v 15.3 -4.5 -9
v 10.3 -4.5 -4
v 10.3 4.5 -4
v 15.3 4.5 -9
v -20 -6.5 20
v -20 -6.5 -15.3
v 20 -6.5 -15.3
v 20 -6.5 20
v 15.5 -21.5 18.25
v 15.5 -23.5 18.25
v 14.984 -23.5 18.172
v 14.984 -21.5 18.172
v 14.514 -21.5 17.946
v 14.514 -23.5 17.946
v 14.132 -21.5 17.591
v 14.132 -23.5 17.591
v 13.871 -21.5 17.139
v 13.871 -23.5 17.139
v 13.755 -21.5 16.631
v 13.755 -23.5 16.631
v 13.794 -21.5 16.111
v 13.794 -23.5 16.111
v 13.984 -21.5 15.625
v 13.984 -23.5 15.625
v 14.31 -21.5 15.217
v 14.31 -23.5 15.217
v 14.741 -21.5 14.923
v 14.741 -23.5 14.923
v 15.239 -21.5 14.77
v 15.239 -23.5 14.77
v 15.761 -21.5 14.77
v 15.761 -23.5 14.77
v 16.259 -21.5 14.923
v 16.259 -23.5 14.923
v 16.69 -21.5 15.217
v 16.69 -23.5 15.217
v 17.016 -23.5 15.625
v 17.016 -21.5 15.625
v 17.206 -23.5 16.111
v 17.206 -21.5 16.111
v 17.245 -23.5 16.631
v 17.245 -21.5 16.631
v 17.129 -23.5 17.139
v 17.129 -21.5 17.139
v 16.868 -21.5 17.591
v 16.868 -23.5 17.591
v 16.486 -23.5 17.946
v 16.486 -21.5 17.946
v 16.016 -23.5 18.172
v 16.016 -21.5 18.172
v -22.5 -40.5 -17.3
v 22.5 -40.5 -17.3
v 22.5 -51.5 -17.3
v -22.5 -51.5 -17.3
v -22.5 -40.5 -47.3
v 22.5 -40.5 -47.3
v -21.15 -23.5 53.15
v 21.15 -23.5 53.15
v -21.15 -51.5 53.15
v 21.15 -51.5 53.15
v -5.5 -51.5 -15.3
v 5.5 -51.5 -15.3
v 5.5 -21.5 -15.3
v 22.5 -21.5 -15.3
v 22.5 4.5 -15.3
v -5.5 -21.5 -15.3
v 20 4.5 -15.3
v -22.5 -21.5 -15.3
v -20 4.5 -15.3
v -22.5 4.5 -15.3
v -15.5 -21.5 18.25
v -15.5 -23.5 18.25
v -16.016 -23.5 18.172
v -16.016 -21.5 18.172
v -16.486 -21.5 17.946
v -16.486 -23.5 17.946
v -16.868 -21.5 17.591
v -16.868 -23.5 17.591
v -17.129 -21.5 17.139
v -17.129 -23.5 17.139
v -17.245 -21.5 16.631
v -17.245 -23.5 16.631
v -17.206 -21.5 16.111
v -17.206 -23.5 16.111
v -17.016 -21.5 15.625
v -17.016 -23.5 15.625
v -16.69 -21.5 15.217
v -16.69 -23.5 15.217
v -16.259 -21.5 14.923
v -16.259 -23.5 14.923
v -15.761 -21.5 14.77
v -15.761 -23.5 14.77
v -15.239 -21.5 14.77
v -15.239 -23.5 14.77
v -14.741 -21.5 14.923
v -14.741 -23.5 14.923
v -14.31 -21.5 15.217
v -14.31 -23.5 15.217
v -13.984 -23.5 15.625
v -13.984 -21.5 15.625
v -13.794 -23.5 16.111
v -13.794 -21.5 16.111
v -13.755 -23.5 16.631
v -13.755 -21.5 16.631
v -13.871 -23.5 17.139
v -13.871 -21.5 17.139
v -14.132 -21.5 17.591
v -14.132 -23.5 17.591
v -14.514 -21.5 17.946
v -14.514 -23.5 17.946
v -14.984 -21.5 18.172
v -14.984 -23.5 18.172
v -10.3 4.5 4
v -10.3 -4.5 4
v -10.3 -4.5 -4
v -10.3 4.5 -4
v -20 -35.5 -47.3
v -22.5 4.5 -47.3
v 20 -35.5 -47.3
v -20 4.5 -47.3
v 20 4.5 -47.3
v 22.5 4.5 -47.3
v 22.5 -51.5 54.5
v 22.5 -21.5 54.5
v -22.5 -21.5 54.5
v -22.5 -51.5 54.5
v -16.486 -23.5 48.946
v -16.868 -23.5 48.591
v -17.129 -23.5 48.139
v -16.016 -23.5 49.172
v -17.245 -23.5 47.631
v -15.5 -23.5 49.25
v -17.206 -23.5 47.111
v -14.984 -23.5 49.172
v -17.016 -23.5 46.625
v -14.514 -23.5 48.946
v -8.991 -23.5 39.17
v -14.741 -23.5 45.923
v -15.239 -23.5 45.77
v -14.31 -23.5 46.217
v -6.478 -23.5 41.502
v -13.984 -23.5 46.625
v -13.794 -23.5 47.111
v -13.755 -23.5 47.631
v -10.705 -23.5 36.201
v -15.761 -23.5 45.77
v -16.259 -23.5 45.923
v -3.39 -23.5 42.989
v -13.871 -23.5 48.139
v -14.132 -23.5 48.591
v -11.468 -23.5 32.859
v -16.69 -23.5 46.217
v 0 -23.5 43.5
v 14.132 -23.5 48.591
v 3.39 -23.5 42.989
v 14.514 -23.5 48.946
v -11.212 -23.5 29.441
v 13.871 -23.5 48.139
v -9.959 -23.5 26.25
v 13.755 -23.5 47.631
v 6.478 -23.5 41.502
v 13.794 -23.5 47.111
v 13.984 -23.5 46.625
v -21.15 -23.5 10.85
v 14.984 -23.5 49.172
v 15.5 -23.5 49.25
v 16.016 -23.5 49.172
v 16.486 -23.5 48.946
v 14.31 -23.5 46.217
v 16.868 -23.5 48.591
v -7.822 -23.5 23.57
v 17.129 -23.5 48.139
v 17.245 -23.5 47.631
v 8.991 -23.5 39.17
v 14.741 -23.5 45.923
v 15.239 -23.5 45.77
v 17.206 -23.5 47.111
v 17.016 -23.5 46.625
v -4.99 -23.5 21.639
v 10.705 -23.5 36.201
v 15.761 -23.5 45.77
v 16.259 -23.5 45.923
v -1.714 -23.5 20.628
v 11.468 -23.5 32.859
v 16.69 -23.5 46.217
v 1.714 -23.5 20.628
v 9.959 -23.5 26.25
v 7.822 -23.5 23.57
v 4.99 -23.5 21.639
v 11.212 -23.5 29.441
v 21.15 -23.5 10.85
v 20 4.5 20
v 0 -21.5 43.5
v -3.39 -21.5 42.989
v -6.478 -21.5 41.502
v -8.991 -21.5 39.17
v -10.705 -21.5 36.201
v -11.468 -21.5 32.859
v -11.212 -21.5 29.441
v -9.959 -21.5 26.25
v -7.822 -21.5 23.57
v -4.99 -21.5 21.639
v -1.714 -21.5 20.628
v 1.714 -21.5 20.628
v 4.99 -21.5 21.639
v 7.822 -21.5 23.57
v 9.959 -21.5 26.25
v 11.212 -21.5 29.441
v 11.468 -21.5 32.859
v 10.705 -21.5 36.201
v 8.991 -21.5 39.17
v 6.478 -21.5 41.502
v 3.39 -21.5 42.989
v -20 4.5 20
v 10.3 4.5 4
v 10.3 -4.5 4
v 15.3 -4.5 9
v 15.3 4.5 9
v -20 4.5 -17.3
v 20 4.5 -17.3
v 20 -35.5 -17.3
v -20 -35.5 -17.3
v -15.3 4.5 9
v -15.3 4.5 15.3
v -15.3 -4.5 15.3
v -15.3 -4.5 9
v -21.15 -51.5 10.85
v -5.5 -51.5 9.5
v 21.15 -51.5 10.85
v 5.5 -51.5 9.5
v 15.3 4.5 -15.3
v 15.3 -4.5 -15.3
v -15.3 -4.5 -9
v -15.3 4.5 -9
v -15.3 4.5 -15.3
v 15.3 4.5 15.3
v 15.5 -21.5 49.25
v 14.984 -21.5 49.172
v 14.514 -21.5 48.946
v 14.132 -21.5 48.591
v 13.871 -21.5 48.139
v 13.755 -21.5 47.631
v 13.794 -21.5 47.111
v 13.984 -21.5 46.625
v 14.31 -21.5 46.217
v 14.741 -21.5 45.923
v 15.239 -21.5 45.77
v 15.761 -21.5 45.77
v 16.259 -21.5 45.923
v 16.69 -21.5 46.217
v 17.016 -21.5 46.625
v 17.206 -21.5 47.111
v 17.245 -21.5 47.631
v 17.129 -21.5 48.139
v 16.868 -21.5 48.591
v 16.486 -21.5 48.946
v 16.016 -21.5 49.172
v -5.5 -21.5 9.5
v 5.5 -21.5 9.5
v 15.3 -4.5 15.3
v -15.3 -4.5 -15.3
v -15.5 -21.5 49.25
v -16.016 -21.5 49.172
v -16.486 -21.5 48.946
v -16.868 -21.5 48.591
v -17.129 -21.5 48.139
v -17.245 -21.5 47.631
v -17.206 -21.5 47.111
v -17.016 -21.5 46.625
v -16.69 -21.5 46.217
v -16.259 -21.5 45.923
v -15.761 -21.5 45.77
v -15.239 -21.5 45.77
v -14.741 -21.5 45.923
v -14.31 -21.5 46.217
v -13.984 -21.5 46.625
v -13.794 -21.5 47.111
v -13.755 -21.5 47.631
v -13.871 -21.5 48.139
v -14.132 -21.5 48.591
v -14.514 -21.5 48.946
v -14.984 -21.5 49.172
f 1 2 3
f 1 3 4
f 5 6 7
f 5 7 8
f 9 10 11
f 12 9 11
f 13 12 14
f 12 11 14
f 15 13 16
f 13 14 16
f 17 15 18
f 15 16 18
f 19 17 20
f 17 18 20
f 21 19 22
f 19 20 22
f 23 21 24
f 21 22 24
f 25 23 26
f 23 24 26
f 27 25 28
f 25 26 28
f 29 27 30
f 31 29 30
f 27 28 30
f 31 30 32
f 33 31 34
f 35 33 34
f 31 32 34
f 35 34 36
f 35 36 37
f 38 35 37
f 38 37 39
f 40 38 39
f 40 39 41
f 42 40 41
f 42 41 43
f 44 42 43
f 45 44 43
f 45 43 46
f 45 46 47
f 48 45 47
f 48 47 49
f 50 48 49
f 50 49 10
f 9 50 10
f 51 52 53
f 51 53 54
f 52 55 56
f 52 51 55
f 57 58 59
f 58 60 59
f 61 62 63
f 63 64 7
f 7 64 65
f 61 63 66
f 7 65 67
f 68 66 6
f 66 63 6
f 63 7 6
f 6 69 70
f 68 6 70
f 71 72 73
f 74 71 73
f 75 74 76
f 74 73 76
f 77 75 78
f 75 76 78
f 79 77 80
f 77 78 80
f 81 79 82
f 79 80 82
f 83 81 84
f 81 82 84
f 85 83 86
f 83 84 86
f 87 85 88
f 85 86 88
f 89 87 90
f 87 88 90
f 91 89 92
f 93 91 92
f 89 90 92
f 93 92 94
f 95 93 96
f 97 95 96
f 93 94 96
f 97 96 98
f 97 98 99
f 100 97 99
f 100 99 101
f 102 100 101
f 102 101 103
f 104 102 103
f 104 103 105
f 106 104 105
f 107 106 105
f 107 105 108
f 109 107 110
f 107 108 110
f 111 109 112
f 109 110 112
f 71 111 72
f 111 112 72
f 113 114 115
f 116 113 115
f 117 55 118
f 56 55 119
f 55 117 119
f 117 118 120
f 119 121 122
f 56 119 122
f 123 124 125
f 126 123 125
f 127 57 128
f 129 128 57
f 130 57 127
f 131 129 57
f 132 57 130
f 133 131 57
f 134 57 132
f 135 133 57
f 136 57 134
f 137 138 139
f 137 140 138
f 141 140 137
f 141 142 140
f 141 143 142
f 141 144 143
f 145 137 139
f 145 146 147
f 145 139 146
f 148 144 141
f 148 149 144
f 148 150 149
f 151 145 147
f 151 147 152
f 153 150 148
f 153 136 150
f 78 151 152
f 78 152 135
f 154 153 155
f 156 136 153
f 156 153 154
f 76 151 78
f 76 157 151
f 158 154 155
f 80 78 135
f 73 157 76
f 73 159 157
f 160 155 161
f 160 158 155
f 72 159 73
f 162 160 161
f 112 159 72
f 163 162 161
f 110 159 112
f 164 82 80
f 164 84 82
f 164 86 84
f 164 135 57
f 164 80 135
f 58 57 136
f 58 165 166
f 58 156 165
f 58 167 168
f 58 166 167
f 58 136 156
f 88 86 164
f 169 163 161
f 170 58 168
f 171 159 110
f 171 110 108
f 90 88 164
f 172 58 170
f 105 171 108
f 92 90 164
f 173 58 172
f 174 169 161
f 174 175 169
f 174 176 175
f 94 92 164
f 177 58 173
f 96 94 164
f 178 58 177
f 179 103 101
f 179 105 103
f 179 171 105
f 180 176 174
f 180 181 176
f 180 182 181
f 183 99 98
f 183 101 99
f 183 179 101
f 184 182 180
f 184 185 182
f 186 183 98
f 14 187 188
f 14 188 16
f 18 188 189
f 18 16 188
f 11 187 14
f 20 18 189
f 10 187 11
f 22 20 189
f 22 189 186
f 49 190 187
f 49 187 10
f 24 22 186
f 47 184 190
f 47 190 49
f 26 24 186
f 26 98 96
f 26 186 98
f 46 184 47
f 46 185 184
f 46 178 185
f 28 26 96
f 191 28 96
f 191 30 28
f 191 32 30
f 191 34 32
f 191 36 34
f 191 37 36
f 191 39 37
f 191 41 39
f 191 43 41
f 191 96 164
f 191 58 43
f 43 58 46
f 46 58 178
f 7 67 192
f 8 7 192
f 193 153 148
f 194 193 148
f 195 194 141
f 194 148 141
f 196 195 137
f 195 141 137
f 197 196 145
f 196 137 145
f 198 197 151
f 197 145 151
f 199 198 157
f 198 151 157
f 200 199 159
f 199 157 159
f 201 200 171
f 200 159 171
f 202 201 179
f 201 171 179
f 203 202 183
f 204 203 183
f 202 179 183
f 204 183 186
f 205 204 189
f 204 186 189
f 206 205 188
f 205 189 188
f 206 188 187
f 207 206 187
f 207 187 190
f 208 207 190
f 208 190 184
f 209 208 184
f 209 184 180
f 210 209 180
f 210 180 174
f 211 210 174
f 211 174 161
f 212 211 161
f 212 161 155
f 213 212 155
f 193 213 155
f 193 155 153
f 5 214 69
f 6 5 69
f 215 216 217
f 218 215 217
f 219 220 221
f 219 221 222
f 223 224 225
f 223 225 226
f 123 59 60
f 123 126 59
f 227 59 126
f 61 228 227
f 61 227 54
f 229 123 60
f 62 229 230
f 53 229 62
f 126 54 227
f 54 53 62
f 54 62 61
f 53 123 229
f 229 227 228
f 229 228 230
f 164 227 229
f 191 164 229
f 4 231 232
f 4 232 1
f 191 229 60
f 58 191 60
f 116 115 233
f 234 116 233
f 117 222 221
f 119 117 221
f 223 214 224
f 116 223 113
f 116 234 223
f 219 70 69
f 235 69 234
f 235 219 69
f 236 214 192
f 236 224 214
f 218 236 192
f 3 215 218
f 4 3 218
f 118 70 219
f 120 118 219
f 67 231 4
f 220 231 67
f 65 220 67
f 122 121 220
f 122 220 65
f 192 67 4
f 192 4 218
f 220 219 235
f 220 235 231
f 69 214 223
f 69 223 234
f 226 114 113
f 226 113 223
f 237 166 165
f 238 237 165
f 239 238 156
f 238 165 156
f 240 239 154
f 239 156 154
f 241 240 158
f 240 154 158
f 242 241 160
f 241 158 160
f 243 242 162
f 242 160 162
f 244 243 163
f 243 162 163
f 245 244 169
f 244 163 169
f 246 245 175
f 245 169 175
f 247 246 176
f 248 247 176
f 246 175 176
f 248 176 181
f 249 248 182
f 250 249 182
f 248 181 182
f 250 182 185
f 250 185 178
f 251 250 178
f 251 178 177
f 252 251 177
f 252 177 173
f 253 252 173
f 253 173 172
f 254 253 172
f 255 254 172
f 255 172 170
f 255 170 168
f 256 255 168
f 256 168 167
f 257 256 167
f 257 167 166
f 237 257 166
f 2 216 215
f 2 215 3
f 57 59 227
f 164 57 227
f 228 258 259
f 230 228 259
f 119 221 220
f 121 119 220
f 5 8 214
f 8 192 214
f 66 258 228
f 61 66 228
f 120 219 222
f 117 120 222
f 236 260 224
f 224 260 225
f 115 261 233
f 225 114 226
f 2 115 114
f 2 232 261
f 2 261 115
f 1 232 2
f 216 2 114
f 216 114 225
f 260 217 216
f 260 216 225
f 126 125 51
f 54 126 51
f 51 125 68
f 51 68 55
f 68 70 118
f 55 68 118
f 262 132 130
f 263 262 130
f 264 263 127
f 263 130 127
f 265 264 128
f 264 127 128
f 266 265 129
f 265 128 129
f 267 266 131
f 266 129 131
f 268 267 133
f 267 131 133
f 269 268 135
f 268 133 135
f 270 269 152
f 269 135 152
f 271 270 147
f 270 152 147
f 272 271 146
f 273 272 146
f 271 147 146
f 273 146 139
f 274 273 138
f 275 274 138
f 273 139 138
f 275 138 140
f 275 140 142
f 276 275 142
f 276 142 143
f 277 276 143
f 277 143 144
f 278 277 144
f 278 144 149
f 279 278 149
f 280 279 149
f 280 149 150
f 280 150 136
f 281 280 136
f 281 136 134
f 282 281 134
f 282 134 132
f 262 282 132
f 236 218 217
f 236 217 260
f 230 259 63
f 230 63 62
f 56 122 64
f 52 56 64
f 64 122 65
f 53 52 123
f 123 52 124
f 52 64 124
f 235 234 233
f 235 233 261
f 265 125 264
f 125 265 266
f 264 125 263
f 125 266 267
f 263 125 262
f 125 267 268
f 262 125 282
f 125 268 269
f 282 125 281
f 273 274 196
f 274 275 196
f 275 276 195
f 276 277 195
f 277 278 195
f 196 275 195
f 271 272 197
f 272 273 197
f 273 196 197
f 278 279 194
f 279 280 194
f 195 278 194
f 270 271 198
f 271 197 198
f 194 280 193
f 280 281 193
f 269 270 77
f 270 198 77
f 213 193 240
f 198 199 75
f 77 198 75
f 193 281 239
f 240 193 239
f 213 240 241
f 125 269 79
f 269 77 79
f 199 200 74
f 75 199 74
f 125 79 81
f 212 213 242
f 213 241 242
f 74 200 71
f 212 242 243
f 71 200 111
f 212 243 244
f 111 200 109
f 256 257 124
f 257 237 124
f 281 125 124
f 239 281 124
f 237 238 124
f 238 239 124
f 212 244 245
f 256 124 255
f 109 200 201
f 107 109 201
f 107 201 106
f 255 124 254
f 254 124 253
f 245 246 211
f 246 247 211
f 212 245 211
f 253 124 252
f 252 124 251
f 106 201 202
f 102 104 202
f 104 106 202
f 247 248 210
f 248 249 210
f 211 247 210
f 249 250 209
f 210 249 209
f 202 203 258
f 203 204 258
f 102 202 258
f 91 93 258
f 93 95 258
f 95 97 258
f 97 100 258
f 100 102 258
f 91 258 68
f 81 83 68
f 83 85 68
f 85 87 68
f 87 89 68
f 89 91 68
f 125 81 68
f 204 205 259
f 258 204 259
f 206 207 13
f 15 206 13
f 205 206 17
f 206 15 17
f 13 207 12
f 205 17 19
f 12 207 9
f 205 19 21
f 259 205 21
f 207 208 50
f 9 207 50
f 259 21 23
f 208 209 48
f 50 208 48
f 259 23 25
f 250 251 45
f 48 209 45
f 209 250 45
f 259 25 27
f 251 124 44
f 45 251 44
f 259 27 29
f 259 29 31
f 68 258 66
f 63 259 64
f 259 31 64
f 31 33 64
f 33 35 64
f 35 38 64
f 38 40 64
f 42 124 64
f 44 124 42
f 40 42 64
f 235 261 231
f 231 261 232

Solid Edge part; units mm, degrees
sketch "Sketch1" plane through (0, 0, 0) normal (0, -1, 0) x (1, 0, 0)
  line L0 (-20, -20) -> (20, -20)
  line L1 (20, -20) -> (20, 20)
  line L2 (20, 20) -> (-20, 20)
  line L3 (-20, 20) -> (-20, -20)
extrude "Protrusion1" add sketch "Sketch1" along normal mid plane 9
sketch "Sketch2" plane through (0, -4.5, 0) normal (0, -1, 0) x (1, 0, 0)
  line L0 (-15.3, -15.3) -> (15.3, -15.3)
  line L1 (15.3, -15.3) -> (15.3, -9)
  line L2 (10.3, -4) -> (15.3, -9)
  line L3 (10.3, 4) -> (10.3, -4)
  line L4 (10.3, 4) -> (15.3, 9)
  line L5 (15.3, 9) -> (15.3, 15.3)
  line L6 (15.3, 15.3) -> (-15.3, 15.3)
  line L7 (-15.3, 15.3) -> (-15.3, 9)
  line L8 (-10.3, 4) -> (-15.3, 9)
  line L9 (-10.3, 4) -> (-10.3, -4)
  line L10 (-10.3, -4) -> (-15.3, -9)
  line L11 (-15.3, -9) -> (-15.3, -15.3)
extrude "ExtrudedCutout_1" cut sketch "Sketch2" against normal blind 161.5
sketch "Sketch3" plane through (0, -21.5, 0) normal (0, -1, 0) x (0, 0, 1)
  line L0 (54.5, -22.5) -> (54.5, 22.5)
  line L1 (54.5, 22.5) -> (9.5, 22.5)
  line L2 (9.5, 22.5) -> (9.5, -22.5)
  line L3 (9.5, -22.5) -> (54.5, -22.5)
  dimension "D1" = 12
extrude "ExtrudedProtrusion_8" add sketch "Sketch3" along normal blind 30
sketch "Sketch4" plane through (0, -36.5, 32) normal (0, -1, 0) x (1, 0, 0)
  line L0 (-21.15, -21.15) -> (21.15, -21.15)
  line L1 (21.15, -21.15) -> (21.15, 21.15)
  line L2 (21.15, 21.15) -> (-21.15, 21.15)
  line L3 (-21.15, 21.15) -> (-21.15, -21.15)
extrude "ExtrudedCutout_4" cut sketch "Sketch4" against normal blind 13 and the other way blind 20
sketch "Sketch5" plane through (0, -23.5, 32) normal (0, -1, 0) x (0, 0, 1)
  circle A0 centre (0, 0) radius 11.5
  circle A1 centre (-15.5, 15.5) radius 1.75
  circle A2 centre (-15.5, -15.5) radius 1.75
  circle A3 centre (15.5, 15.5) radius 1.75
  circle A4 centre (15.5, -15.5) radius 1.75
  dimension "D1" = 15.5
  dimension "D2" = 5.65
extrude "Cutout1" cut sketch "Sketch5" against normal up to next
sketch "Sketch6" plane through (0, -4.5, 0) normal (0, -1, 0) x (1, 0, 0)
  line L0 (-20, 20) -> (20, 20)
  line L1 (20, 20) -> (20, -20)
  line L2 (20, -20) -> (-20, -20)
  line L3 (-20, -20) -> (-20, 20)
extrude "ExtrudedProtrusion_9" add sketch "Sketch6" along normal blind 2
sketch "Sketch7" plane through (0, -36.5, 9.5) normal (0, 0, -1) x (1, 0, 0)
  line L0 (-22.5, 15) -> (-22.5, -15)
  line L1 (-22.5, -15) -> (-5.5, -15)
  line L2 (-5.5, -15) -> (-5.5, 15)
  line L3 (-5.5, 15) -> (-22.5, 15)
  line L4 (22.5, 15) -> (22.5, -15)
  line L5 (22.5, -15) -> (5.5, -15)
  line L6 (5.5, -15) -> (5.5, 15)
  line L7 (5.5, 15) -> (22.5, 15)
extrude "ExtrudedProtrusion_13" add sketch "Sketch7" along normal blind 29
sketch "Sketch8" plane through (0, -1, -20) normal (0, 0, -1) x (0, -1, 0)
  line L0 (50.5, 22.5) -> (-5.5, 22.5)
  line L1 (-5.5, 22.5) -> (-5.5, -22.5)
  line L2 (-5.5, -22.5) -> (50.5, -22.5)
  line L3 (50.5, -22.5) -> (50.5, 22.5)
extrude "ExtrudedProtrusion_14" add sketch "Sketch8" against normal blind 4.7
sketch "Sketch9" plane through (0, -23.5, -20) normal (0, 0, -1) x (-1, 0, 0)
  line L0 (-22.5, -28) -> (22.5, -28)
  line L1 (22.5, -28) -> (22.5, 28)
  line L2 (22.5, 28) -> (-22.5, 28)
  line L3 (-22.5, 28) -> (-22.5, -28)
extrude "ExtrudedCutout_6" cut sketch "Sketch9" against normal blind 2.7
sketch "Sketch10" plane through (0, -23.5, -17.3) normal (0, 0, -1) x (-1, 0, 0)
  line L0 (20, 28) -> (22.5, 28)
  line L1 (22.5, 28) -> (22.5, -17)
  line L2 (22.5, -17) -> (-22.5, -17)
  line L3 (-22.5, -17) -> (-22.5, 28)
  line L4 (-22.5, 28) -> (-20, 28)
  line L5 (-20, -12) -> (-20, 28)
  line L6 (20, -12) -> (-20, -12)
  line L7 (20, 28) -> (20, -12)
  dimension "D1" = 20
extrude "ExtrudedProtrusion_15" add sketch "Sketch10" along normal blind 30
